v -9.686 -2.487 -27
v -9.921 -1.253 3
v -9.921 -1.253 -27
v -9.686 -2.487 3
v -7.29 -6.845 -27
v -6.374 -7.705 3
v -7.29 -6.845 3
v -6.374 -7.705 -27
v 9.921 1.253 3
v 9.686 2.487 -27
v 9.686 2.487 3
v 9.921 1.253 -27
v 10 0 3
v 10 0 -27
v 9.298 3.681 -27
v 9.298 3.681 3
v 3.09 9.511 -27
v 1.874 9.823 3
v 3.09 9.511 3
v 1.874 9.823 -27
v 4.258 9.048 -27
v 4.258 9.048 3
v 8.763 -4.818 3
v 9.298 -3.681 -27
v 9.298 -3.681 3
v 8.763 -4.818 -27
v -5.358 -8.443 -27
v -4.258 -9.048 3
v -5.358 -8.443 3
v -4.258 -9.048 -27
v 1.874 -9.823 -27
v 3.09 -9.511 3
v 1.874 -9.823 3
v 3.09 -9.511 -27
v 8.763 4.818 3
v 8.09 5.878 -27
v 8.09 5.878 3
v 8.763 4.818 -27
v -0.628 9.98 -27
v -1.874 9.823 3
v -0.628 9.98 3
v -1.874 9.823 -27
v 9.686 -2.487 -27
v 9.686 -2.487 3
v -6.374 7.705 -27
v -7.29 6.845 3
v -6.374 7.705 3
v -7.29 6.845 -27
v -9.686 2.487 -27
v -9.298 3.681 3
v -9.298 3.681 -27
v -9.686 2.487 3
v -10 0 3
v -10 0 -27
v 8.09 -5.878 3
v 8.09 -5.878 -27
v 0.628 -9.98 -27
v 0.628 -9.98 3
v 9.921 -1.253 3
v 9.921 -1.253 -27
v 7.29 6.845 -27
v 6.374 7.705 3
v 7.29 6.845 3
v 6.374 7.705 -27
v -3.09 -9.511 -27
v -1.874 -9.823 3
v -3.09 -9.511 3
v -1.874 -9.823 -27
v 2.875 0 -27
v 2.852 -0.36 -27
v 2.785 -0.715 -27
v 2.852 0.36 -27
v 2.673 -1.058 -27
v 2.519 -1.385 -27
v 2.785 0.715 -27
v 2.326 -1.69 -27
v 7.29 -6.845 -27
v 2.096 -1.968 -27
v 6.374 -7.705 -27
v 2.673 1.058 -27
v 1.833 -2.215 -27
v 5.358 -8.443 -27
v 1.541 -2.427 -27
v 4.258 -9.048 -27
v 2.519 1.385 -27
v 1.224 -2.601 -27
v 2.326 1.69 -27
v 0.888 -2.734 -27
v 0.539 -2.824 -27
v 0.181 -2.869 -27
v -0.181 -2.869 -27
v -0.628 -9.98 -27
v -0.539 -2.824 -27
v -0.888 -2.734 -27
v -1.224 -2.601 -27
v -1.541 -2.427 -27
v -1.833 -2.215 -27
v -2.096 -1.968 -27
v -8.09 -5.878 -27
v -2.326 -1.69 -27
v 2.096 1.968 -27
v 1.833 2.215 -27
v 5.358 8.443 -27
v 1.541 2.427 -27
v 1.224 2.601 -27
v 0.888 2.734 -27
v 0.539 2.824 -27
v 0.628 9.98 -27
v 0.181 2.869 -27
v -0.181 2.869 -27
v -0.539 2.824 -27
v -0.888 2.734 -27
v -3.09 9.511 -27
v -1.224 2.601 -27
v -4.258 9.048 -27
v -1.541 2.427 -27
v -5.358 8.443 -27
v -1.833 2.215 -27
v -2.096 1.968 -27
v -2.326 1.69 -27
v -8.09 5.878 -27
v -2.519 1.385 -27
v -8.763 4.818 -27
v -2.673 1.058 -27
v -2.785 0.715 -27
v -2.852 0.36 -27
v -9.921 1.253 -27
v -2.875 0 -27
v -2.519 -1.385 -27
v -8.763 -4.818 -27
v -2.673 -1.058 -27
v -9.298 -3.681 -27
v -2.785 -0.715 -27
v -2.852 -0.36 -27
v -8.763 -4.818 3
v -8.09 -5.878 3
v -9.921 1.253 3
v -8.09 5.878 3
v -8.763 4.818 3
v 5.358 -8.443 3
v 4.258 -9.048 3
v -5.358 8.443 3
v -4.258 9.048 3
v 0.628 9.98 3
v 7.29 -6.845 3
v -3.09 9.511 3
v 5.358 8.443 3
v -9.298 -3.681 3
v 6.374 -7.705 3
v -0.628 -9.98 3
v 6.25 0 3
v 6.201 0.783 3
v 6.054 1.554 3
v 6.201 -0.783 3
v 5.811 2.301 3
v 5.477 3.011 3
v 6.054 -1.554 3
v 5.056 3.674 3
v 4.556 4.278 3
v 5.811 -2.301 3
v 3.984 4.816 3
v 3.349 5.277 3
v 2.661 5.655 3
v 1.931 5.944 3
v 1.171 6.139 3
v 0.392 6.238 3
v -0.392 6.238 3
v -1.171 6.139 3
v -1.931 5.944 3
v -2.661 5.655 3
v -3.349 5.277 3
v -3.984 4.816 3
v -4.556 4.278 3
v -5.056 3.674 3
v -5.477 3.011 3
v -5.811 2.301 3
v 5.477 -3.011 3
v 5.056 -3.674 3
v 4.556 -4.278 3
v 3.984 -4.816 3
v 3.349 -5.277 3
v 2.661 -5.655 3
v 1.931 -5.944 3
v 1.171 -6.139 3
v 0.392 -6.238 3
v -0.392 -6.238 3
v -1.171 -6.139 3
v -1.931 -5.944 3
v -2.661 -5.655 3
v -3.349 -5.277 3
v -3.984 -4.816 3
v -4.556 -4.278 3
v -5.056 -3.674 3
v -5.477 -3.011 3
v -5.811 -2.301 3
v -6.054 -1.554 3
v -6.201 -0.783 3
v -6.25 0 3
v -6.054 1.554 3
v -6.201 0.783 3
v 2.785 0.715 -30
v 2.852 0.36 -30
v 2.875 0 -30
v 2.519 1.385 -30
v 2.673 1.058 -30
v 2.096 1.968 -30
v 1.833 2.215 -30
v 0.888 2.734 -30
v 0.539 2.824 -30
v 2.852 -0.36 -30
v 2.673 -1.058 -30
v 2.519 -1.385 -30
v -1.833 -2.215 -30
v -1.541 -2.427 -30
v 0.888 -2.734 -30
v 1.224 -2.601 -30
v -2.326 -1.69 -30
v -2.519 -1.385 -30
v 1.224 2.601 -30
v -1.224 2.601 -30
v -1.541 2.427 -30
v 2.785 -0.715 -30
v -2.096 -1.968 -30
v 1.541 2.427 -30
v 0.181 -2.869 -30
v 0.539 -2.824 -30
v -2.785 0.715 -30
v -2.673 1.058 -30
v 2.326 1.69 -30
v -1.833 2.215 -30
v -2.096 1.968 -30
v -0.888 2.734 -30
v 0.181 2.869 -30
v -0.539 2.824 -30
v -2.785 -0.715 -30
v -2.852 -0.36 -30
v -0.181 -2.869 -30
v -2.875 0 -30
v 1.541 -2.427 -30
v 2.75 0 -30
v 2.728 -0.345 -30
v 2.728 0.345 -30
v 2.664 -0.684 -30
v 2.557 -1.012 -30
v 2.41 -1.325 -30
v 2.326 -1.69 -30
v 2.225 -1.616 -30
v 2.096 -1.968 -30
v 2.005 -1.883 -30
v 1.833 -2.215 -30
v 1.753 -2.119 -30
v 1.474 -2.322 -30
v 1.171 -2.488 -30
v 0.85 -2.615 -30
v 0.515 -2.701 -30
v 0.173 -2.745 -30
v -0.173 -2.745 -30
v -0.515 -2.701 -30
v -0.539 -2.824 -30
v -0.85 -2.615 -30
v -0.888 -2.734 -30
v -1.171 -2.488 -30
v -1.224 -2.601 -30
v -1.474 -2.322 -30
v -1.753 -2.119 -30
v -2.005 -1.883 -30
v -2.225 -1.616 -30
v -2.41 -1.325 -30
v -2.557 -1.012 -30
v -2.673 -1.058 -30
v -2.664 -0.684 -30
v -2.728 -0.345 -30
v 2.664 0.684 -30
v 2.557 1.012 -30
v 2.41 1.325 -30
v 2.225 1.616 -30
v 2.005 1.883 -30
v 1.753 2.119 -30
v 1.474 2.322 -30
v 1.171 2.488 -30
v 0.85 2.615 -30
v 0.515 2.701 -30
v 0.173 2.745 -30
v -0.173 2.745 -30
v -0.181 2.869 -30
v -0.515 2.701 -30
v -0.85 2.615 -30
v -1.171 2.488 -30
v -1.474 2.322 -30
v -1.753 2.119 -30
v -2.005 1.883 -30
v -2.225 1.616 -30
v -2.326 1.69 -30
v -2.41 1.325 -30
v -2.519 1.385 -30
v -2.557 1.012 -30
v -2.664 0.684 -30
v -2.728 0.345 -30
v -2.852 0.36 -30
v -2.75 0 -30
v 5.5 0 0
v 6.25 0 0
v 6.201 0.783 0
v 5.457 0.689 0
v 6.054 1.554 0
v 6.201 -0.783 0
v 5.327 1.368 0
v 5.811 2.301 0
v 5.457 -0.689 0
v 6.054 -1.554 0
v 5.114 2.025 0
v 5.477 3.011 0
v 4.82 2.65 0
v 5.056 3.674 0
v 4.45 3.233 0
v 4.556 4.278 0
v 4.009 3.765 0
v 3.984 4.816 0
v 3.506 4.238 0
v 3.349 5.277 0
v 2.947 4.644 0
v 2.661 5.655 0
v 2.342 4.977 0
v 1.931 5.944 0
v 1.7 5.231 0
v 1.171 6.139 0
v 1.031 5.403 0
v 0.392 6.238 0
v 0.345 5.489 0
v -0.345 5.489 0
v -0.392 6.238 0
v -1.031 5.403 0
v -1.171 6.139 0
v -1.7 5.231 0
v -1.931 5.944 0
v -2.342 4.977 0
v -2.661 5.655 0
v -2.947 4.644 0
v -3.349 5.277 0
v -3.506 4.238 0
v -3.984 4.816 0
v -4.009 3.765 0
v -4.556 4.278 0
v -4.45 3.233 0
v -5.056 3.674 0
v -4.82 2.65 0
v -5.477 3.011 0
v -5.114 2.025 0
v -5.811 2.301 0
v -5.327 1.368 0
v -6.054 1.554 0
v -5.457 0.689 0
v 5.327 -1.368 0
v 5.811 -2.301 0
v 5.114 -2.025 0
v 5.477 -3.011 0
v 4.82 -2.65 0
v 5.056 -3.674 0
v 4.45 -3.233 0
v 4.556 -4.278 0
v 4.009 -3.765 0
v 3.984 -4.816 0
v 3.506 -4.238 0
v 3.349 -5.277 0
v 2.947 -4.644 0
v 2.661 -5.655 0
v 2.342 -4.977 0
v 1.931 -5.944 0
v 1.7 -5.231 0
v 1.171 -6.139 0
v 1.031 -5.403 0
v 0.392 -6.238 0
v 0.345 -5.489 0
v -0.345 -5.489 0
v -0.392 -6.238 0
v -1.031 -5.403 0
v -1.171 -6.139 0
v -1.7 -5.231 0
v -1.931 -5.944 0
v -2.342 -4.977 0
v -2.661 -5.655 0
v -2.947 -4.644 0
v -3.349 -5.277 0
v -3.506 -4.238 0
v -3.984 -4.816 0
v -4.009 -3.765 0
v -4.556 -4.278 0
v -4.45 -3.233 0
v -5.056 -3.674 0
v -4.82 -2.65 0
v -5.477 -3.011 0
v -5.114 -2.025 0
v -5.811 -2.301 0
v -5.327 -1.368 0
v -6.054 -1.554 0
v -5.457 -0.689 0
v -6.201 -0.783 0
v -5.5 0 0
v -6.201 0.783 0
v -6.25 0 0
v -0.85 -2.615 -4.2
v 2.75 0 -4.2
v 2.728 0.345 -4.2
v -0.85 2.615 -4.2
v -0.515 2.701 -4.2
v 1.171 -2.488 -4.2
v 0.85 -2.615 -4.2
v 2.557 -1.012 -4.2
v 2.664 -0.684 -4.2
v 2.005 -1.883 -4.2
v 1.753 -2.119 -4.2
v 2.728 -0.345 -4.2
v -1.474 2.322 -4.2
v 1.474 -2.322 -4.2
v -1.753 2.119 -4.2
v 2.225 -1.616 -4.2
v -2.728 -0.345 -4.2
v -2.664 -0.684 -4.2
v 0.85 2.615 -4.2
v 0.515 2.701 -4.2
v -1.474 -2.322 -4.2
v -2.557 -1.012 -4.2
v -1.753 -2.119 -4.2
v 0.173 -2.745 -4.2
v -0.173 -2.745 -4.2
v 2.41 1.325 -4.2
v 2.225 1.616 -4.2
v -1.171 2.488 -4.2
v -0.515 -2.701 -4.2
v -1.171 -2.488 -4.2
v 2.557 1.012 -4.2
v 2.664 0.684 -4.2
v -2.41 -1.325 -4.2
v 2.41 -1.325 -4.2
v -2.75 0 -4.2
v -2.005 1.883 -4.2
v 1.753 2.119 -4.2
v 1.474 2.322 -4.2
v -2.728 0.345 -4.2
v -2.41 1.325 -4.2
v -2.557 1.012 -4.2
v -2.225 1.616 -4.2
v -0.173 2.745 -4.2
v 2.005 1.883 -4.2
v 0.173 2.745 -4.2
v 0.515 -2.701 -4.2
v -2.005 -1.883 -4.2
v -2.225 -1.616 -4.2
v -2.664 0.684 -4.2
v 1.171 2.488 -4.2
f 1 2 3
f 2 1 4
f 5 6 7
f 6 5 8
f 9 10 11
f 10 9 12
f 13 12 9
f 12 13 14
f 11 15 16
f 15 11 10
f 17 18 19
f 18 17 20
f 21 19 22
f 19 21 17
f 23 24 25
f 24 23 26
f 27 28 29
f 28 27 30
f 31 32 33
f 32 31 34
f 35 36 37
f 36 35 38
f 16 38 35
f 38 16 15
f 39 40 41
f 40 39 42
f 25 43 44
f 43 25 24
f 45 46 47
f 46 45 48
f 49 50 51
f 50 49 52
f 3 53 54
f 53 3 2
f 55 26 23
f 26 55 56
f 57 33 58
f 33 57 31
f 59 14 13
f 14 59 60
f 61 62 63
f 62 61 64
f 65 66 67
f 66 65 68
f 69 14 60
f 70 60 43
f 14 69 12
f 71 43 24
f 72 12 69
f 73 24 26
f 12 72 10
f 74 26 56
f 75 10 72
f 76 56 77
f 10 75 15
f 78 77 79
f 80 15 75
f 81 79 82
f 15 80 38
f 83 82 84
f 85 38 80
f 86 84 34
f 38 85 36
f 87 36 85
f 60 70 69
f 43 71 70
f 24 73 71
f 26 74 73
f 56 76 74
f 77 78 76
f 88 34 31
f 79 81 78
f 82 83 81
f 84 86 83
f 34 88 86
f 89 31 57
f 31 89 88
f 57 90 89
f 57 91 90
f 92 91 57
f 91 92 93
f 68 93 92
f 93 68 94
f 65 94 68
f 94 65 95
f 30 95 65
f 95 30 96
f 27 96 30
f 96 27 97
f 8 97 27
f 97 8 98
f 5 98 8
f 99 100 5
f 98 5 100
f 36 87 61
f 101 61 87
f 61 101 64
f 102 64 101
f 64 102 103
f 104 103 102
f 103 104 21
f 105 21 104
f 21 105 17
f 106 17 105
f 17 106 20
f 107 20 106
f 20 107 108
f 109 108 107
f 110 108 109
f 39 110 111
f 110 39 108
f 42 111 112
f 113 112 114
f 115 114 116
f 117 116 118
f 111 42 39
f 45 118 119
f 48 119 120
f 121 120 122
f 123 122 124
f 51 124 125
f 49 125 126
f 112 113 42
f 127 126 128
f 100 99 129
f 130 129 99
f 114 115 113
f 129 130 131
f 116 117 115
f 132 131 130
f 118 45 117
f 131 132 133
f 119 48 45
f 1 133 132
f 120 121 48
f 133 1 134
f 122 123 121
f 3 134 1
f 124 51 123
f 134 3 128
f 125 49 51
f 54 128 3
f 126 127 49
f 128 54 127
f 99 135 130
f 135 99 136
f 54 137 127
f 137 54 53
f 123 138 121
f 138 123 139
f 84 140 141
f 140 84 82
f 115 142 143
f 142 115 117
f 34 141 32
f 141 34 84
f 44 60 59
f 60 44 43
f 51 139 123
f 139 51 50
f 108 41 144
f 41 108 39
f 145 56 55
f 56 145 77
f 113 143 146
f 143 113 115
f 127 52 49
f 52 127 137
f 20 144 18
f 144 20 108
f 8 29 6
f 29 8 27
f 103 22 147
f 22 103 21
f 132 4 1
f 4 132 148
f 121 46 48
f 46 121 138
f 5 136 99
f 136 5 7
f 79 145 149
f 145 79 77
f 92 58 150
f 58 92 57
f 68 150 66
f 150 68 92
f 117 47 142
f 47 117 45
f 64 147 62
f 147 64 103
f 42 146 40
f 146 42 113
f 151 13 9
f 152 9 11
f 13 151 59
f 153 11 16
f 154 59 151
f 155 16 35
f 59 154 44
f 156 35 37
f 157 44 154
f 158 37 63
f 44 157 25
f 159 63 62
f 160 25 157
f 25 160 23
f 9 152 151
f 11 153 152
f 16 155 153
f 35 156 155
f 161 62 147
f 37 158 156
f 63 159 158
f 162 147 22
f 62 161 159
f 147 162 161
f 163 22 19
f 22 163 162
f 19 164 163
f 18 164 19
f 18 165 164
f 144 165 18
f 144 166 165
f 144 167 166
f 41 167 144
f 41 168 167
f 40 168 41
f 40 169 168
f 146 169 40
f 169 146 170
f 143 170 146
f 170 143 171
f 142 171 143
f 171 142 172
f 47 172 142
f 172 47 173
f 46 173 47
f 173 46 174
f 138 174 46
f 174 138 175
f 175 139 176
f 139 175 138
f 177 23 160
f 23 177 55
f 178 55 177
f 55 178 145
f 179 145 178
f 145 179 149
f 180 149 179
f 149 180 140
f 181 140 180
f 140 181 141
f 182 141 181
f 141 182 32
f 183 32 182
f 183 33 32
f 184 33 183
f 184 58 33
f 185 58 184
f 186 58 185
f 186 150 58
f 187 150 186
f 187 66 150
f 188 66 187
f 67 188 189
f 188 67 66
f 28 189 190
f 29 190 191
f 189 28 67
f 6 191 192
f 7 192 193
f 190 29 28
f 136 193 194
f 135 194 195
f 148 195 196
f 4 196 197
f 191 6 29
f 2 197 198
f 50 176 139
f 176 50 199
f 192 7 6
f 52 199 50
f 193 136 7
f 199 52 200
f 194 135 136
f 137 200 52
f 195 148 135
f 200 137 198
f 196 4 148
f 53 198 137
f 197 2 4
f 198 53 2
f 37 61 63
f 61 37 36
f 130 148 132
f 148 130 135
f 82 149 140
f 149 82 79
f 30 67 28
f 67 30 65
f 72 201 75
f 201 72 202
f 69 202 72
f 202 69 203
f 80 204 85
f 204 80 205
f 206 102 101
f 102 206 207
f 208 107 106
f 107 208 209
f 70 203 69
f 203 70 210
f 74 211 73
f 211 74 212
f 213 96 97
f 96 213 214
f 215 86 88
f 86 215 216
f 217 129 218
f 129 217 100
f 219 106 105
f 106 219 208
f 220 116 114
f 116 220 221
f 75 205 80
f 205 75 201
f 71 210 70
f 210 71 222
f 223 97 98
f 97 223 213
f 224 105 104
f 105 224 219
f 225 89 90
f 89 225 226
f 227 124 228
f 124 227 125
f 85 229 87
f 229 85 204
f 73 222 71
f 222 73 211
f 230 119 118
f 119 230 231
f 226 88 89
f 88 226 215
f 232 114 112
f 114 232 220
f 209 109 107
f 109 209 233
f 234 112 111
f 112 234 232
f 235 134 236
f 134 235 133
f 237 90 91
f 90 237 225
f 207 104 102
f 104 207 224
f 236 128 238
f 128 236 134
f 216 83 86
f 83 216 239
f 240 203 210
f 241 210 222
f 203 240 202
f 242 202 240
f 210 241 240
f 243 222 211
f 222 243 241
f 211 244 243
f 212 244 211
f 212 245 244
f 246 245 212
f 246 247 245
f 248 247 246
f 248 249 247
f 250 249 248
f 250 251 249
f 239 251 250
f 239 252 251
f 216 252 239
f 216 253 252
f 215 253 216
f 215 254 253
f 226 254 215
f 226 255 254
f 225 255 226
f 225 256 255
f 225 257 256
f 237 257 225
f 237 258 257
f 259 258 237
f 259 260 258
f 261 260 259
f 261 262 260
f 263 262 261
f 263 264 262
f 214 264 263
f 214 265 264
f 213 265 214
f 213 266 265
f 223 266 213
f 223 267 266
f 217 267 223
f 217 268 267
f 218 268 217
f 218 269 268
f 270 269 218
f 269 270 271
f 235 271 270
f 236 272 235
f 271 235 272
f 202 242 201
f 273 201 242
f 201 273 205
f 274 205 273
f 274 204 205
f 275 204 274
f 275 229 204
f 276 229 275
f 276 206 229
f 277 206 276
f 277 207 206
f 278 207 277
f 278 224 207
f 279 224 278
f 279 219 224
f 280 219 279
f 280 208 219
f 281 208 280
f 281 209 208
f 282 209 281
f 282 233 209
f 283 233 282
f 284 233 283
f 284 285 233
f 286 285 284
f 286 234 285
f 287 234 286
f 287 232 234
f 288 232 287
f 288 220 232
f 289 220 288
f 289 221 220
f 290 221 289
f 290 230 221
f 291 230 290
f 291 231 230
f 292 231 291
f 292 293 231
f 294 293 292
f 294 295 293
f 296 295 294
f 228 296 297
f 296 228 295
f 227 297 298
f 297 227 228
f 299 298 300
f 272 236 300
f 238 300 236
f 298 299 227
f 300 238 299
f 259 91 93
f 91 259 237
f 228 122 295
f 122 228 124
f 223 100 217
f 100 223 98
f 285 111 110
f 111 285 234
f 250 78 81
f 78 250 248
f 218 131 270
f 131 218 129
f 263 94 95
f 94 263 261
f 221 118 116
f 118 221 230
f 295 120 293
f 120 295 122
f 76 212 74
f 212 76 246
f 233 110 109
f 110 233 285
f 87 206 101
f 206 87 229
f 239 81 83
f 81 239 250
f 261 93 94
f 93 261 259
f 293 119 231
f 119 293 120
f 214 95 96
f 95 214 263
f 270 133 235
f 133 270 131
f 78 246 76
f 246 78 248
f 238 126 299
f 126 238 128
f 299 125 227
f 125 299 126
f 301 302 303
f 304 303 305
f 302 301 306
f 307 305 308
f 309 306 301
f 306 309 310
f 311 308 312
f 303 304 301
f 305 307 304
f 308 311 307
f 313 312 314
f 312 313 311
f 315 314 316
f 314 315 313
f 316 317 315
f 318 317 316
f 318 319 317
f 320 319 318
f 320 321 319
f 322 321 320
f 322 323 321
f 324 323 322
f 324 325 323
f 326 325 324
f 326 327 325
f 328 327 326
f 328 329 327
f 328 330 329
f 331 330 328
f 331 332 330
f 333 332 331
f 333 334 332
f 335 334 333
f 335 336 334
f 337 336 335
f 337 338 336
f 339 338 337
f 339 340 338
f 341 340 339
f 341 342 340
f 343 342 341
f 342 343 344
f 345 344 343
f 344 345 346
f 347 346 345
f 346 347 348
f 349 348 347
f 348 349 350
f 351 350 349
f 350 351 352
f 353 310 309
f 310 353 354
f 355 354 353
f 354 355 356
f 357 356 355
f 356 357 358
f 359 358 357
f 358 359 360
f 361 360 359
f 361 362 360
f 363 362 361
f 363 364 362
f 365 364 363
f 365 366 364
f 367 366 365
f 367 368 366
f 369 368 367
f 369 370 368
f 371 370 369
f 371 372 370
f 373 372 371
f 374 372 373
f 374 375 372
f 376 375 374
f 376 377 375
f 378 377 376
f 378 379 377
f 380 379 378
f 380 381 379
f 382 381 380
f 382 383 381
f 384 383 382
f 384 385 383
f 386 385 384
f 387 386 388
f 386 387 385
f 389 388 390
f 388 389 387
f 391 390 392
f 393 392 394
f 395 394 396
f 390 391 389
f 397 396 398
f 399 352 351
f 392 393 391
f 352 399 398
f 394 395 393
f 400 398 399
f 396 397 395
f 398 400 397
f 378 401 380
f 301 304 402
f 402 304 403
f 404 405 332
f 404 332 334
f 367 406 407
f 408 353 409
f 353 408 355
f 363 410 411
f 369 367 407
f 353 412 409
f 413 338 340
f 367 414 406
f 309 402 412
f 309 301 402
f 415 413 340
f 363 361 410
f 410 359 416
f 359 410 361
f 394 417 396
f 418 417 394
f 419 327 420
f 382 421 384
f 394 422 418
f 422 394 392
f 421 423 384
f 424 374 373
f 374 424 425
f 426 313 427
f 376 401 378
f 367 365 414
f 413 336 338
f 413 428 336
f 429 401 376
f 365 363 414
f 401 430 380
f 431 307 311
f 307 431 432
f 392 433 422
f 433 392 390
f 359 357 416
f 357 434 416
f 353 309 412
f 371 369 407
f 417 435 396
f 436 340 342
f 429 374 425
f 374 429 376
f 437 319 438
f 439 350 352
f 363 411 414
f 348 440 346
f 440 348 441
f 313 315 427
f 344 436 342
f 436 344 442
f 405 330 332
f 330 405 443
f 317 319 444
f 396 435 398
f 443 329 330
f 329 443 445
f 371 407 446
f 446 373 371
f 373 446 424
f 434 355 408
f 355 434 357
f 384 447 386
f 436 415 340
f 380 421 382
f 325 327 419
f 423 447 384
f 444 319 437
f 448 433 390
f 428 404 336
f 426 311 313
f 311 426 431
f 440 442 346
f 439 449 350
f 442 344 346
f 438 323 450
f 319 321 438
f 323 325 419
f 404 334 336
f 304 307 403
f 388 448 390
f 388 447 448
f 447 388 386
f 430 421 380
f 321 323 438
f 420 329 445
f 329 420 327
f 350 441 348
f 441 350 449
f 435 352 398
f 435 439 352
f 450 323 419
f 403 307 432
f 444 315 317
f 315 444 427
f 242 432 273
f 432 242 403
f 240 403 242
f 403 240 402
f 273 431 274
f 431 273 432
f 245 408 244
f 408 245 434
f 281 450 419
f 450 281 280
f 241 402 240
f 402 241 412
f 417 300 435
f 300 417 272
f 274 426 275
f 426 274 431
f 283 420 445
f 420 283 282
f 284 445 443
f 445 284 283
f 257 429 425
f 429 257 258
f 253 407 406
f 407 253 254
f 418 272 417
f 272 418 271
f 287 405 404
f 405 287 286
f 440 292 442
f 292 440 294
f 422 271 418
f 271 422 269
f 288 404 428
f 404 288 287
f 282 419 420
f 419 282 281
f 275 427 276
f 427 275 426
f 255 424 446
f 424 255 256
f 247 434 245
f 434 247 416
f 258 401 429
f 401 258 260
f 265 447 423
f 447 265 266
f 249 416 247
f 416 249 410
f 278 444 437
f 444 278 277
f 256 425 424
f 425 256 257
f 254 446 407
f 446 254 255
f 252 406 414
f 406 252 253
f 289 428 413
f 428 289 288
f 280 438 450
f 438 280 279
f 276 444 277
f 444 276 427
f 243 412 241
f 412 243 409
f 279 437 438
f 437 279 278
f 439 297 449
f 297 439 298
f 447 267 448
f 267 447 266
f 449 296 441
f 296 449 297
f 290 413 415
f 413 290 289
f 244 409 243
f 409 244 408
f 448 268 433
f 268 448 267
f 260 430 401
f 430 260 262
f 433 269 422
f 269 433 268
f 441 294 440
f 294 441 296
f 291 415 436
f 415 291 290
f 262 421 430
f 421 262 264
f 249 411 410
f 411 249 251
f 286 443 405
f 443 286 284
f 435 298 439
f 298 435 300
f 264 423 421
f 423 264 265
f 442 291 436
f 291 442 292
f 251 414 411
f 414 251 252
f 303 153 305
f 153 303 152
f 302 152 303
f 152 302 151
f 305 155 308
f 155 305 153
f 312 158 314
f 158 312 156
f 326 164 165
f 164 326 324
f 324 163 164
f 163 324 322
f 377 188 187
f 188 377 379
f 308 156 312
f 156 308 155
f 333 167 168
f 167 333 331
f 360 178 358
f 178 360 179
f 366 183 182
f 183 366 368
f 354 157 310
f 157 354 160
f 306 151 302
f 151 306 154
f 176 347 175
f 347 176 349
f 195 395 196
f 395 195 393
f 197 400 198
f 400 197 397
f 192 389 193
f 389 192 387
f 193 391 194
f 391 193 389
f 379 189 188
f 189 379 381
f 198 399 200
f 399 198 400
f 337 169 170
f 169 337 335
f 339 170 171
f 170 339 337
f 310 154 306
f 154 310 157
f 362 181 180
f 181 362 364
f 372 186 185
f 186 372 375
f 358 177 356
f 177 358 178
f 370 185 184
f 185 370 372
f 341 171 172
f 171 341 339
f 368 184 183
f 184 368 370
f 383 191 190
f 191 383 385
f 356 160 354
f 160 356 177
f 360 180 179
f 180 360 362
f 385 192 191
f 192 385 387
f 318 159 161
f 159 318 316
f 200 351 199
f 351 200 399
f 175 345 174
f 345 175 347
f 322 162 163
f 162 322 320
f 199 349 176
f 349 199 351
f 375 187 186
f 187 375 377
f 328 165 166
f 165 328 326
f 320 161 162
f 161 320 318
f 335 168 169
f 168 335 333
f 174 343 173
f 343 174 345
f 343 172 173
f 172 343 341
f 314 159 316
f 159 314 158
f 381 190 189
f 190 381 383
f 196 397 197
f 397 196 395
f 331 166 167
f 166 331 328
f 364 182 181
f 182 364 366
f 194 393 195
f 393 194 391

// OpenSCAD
$fn = 50;

difference() {
	union() {
		translate(v = [0, 0, -27.0]) {
			cylinder(h = 30, r = 10.0);
		}
		#translate(v = [0, 0, -30.0]) {
			cylinder(h = 30, r = 2.875);
		}
	}
	union() {
		translate(v = [0, 0, 0]) {
			rotate(a = [0, 0, 0]) {
				difference() {
					union() {
						translate(v = [0, 0, -30.0]) {
							cylinder(h = 30, r = 2.25);
						}
						translate(v = [0, 0, -4.2]) {
							cylinder(h = 4.2, r1 = 2.75, r2 = 5.5);
						}
						translate(v = [0, 0, -30.0]) {
							cylinder(h = 30, r = 2.75);
						}
						translate(v = [0, 0, -30.0]) {
							cylinder(h = 30, r = 2.25);
						}
					}
					union();
				}
			}
		}
		#cylinder(h = 3, r = 6.25);
	}
}
